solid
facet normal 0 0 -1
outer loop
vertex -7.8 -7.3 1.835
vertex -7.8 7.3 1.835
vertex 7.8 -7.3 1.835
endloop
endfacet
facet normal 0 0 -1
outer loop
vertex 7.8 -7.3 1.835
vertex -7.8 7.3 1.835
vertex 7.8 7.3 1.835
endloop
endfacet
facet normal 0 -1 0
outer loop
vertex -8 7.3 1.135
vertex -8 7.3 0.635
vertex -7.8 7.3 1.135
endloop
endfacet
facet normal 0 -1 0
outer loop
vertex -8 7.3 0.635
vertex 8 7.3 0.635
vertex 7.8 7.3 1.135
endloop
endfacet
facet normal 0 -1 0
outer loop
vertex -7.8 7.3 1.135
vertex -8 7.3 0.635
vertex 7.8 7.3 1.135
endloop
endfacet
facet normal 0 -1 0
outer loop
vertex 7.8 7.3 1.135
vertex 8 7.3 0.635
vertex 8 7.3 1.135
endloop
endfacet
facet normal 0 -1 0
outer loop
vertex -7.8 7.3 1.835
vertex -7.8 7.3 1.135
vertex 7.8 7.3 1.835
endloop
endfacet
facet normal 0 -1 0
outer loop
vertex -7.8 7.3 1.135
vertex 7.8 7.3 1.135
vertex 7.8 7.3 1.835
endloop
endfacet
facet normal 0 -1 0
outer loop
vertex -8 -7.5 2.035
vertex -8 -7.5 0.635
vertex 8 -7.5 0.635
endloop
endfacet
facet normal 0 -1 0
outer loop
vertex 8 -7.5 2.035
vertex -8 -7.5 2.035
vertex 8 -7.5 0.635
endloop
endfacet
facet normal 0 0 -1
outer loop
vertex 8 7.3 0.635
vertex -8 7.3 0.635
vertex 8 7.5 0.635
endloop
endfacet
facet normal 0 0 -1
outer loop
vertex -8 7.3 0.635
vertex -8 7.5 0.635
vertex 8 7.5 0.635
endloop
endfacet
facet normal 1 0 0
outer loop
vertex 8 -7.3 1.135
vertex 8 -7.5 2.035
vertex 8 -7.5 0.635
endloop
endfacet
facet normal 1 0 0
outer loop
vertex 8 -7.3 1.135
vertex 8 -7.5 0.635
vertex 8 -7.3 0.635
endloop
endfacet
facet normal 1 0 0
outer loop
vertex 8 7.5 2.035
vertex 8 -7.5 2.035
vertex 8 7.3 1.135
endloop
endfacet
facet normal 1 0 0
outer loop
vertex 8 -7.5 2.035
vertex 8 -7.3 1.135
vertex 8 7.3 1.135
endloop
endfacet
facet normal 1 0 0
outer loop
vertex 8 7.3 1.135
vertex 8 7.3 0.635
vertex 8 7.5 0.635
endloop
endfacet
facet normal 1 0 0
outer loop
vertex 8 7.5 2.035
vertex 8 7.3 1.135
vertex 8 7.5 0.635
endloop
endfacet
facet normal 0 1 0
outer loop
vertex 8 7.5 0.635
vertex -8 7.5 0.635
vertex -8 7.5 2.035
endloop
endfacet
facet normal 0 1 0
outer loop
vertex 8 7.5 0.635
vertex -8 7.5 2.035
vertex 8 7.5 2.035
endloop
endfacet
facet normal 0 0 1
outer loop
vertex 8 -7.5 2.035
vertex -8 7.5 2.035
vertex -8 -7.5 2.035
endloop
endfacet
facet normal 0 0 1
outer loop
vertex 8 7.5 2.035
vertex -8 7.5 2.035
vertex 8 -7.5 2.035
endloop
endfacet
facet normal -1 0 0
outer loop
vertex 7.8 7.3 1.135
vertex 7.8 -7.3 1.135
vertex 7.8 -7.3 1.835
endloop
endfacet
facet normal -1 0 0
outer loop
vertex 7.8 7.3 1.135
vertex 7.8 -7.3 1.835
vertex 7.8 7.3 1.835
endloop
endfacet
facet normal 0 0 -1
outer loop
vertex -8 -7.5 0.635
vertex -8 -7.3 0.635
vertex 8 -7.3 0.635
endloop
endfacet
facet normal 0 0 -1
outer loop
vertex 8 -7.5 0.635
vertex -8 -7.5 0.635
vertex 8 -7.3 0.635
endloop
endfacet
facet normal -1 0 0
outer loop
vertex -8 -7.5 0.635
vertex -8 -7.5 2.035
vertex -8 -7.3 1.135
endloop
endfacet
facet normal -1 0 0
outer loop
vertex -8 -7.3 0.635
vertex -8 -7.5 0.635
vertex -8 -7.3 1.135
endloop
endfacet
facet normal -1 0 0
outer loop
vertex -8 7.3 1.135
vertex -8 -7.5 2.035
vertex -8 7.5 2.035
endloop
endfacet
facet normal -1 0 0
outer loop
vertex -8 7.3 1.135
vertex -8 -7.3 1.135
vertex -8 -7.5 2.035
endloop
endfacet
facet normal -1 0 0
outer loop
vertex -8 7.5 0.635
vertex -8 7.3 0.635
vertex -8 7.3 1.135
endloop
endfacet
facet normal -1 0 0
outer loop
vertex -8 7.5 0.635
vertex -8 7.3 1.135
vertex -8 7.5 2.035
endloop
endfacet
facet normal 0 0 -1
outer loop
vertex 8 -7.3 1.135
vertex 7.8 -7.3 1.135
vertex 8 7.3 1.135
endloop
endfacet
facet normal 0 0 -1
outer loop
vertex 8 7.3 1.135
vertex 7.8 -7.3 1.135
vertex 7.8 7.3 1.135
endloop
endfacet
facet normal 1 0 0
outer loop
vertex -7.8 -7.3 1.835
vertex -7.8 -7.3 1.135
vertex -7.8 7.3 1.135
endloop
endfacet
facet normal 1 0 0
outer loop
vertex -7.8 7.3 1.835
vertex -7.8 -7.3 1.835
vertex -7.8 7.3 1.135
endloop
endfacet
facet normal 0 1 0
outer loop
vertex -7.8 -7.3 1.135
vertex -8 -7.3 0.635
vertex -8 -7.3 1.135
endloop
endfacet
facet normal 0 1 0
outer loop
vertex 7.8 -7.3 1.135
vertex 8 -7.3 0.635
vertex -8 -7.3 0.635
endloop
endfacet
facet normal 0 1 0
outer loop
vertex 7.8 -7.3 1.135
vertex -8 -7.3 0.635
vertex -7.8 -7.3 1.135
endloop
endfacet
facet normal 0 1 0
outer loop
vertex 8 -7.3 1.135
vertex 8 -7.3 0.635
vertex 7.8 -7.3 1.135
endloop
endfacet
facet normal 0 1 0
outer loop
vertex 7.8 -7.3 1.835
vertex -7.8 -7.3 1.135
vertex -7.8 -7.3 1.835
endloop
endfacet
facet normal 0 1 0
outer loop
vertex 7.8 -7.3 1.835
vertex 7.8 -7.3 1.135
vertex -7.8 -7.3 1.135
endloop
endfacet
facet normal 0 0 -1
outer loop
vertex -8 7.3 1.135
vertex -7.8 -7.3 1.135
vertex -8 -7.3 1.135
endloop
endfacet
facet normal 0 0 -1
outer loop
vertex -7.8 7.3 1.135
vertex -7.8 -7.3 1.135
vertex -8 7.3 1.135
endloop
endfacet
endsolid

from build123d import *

# Parameters (mm, degrees)
SKETCH003_W          = 16
SKETCH003_H          = 15
PAD001_DEPTH         = 1.4
THICKNESS_T          = -0.2
SKETCH004_W          = 14.6
SKETCH004_H          = 0.5
POCKET002_DEPTH      = 8.001
POCKET002_DEPTH_BACK = 8.001


with BuildPart() as part:
    # Sketch003 → Pad001 (new body)
    with BuildSketch(Plane.XY):
        Rectangle(SKETCH003_W, SKETCH003_H)
    extrude(amount=PAD001_DEPTH)

    # Thickness
    thickness_openings = [part.faces().sort_by_distance(p)[0] for p in [
        (0, 0, 0),
    ]]
    offset(amount=THICKNESS_T, openings=thickness_openings)

    # Sketch004 → Pocket002 (cut, two sides)
    with BuildSketch(Plane.YZ) as pocket002_sk:
        with Locations((0, 0.25)):
            Rectangle(SKETCH004_W, SKETCH004_H)
    extrude(amount=-POCKET002_DEPTH, mode=Mode.SUBTRACT)
    extrude(pocket002_sk.sketch, amount=POCKET002_DEPTH_BACK, mode=Mode.SUBTRACT)


with BuildPart() as part_1:
    # Body001 placement: moved
    add(part.part.moved(Location((0, 0, 0.6348))))


solid = part_1.part
